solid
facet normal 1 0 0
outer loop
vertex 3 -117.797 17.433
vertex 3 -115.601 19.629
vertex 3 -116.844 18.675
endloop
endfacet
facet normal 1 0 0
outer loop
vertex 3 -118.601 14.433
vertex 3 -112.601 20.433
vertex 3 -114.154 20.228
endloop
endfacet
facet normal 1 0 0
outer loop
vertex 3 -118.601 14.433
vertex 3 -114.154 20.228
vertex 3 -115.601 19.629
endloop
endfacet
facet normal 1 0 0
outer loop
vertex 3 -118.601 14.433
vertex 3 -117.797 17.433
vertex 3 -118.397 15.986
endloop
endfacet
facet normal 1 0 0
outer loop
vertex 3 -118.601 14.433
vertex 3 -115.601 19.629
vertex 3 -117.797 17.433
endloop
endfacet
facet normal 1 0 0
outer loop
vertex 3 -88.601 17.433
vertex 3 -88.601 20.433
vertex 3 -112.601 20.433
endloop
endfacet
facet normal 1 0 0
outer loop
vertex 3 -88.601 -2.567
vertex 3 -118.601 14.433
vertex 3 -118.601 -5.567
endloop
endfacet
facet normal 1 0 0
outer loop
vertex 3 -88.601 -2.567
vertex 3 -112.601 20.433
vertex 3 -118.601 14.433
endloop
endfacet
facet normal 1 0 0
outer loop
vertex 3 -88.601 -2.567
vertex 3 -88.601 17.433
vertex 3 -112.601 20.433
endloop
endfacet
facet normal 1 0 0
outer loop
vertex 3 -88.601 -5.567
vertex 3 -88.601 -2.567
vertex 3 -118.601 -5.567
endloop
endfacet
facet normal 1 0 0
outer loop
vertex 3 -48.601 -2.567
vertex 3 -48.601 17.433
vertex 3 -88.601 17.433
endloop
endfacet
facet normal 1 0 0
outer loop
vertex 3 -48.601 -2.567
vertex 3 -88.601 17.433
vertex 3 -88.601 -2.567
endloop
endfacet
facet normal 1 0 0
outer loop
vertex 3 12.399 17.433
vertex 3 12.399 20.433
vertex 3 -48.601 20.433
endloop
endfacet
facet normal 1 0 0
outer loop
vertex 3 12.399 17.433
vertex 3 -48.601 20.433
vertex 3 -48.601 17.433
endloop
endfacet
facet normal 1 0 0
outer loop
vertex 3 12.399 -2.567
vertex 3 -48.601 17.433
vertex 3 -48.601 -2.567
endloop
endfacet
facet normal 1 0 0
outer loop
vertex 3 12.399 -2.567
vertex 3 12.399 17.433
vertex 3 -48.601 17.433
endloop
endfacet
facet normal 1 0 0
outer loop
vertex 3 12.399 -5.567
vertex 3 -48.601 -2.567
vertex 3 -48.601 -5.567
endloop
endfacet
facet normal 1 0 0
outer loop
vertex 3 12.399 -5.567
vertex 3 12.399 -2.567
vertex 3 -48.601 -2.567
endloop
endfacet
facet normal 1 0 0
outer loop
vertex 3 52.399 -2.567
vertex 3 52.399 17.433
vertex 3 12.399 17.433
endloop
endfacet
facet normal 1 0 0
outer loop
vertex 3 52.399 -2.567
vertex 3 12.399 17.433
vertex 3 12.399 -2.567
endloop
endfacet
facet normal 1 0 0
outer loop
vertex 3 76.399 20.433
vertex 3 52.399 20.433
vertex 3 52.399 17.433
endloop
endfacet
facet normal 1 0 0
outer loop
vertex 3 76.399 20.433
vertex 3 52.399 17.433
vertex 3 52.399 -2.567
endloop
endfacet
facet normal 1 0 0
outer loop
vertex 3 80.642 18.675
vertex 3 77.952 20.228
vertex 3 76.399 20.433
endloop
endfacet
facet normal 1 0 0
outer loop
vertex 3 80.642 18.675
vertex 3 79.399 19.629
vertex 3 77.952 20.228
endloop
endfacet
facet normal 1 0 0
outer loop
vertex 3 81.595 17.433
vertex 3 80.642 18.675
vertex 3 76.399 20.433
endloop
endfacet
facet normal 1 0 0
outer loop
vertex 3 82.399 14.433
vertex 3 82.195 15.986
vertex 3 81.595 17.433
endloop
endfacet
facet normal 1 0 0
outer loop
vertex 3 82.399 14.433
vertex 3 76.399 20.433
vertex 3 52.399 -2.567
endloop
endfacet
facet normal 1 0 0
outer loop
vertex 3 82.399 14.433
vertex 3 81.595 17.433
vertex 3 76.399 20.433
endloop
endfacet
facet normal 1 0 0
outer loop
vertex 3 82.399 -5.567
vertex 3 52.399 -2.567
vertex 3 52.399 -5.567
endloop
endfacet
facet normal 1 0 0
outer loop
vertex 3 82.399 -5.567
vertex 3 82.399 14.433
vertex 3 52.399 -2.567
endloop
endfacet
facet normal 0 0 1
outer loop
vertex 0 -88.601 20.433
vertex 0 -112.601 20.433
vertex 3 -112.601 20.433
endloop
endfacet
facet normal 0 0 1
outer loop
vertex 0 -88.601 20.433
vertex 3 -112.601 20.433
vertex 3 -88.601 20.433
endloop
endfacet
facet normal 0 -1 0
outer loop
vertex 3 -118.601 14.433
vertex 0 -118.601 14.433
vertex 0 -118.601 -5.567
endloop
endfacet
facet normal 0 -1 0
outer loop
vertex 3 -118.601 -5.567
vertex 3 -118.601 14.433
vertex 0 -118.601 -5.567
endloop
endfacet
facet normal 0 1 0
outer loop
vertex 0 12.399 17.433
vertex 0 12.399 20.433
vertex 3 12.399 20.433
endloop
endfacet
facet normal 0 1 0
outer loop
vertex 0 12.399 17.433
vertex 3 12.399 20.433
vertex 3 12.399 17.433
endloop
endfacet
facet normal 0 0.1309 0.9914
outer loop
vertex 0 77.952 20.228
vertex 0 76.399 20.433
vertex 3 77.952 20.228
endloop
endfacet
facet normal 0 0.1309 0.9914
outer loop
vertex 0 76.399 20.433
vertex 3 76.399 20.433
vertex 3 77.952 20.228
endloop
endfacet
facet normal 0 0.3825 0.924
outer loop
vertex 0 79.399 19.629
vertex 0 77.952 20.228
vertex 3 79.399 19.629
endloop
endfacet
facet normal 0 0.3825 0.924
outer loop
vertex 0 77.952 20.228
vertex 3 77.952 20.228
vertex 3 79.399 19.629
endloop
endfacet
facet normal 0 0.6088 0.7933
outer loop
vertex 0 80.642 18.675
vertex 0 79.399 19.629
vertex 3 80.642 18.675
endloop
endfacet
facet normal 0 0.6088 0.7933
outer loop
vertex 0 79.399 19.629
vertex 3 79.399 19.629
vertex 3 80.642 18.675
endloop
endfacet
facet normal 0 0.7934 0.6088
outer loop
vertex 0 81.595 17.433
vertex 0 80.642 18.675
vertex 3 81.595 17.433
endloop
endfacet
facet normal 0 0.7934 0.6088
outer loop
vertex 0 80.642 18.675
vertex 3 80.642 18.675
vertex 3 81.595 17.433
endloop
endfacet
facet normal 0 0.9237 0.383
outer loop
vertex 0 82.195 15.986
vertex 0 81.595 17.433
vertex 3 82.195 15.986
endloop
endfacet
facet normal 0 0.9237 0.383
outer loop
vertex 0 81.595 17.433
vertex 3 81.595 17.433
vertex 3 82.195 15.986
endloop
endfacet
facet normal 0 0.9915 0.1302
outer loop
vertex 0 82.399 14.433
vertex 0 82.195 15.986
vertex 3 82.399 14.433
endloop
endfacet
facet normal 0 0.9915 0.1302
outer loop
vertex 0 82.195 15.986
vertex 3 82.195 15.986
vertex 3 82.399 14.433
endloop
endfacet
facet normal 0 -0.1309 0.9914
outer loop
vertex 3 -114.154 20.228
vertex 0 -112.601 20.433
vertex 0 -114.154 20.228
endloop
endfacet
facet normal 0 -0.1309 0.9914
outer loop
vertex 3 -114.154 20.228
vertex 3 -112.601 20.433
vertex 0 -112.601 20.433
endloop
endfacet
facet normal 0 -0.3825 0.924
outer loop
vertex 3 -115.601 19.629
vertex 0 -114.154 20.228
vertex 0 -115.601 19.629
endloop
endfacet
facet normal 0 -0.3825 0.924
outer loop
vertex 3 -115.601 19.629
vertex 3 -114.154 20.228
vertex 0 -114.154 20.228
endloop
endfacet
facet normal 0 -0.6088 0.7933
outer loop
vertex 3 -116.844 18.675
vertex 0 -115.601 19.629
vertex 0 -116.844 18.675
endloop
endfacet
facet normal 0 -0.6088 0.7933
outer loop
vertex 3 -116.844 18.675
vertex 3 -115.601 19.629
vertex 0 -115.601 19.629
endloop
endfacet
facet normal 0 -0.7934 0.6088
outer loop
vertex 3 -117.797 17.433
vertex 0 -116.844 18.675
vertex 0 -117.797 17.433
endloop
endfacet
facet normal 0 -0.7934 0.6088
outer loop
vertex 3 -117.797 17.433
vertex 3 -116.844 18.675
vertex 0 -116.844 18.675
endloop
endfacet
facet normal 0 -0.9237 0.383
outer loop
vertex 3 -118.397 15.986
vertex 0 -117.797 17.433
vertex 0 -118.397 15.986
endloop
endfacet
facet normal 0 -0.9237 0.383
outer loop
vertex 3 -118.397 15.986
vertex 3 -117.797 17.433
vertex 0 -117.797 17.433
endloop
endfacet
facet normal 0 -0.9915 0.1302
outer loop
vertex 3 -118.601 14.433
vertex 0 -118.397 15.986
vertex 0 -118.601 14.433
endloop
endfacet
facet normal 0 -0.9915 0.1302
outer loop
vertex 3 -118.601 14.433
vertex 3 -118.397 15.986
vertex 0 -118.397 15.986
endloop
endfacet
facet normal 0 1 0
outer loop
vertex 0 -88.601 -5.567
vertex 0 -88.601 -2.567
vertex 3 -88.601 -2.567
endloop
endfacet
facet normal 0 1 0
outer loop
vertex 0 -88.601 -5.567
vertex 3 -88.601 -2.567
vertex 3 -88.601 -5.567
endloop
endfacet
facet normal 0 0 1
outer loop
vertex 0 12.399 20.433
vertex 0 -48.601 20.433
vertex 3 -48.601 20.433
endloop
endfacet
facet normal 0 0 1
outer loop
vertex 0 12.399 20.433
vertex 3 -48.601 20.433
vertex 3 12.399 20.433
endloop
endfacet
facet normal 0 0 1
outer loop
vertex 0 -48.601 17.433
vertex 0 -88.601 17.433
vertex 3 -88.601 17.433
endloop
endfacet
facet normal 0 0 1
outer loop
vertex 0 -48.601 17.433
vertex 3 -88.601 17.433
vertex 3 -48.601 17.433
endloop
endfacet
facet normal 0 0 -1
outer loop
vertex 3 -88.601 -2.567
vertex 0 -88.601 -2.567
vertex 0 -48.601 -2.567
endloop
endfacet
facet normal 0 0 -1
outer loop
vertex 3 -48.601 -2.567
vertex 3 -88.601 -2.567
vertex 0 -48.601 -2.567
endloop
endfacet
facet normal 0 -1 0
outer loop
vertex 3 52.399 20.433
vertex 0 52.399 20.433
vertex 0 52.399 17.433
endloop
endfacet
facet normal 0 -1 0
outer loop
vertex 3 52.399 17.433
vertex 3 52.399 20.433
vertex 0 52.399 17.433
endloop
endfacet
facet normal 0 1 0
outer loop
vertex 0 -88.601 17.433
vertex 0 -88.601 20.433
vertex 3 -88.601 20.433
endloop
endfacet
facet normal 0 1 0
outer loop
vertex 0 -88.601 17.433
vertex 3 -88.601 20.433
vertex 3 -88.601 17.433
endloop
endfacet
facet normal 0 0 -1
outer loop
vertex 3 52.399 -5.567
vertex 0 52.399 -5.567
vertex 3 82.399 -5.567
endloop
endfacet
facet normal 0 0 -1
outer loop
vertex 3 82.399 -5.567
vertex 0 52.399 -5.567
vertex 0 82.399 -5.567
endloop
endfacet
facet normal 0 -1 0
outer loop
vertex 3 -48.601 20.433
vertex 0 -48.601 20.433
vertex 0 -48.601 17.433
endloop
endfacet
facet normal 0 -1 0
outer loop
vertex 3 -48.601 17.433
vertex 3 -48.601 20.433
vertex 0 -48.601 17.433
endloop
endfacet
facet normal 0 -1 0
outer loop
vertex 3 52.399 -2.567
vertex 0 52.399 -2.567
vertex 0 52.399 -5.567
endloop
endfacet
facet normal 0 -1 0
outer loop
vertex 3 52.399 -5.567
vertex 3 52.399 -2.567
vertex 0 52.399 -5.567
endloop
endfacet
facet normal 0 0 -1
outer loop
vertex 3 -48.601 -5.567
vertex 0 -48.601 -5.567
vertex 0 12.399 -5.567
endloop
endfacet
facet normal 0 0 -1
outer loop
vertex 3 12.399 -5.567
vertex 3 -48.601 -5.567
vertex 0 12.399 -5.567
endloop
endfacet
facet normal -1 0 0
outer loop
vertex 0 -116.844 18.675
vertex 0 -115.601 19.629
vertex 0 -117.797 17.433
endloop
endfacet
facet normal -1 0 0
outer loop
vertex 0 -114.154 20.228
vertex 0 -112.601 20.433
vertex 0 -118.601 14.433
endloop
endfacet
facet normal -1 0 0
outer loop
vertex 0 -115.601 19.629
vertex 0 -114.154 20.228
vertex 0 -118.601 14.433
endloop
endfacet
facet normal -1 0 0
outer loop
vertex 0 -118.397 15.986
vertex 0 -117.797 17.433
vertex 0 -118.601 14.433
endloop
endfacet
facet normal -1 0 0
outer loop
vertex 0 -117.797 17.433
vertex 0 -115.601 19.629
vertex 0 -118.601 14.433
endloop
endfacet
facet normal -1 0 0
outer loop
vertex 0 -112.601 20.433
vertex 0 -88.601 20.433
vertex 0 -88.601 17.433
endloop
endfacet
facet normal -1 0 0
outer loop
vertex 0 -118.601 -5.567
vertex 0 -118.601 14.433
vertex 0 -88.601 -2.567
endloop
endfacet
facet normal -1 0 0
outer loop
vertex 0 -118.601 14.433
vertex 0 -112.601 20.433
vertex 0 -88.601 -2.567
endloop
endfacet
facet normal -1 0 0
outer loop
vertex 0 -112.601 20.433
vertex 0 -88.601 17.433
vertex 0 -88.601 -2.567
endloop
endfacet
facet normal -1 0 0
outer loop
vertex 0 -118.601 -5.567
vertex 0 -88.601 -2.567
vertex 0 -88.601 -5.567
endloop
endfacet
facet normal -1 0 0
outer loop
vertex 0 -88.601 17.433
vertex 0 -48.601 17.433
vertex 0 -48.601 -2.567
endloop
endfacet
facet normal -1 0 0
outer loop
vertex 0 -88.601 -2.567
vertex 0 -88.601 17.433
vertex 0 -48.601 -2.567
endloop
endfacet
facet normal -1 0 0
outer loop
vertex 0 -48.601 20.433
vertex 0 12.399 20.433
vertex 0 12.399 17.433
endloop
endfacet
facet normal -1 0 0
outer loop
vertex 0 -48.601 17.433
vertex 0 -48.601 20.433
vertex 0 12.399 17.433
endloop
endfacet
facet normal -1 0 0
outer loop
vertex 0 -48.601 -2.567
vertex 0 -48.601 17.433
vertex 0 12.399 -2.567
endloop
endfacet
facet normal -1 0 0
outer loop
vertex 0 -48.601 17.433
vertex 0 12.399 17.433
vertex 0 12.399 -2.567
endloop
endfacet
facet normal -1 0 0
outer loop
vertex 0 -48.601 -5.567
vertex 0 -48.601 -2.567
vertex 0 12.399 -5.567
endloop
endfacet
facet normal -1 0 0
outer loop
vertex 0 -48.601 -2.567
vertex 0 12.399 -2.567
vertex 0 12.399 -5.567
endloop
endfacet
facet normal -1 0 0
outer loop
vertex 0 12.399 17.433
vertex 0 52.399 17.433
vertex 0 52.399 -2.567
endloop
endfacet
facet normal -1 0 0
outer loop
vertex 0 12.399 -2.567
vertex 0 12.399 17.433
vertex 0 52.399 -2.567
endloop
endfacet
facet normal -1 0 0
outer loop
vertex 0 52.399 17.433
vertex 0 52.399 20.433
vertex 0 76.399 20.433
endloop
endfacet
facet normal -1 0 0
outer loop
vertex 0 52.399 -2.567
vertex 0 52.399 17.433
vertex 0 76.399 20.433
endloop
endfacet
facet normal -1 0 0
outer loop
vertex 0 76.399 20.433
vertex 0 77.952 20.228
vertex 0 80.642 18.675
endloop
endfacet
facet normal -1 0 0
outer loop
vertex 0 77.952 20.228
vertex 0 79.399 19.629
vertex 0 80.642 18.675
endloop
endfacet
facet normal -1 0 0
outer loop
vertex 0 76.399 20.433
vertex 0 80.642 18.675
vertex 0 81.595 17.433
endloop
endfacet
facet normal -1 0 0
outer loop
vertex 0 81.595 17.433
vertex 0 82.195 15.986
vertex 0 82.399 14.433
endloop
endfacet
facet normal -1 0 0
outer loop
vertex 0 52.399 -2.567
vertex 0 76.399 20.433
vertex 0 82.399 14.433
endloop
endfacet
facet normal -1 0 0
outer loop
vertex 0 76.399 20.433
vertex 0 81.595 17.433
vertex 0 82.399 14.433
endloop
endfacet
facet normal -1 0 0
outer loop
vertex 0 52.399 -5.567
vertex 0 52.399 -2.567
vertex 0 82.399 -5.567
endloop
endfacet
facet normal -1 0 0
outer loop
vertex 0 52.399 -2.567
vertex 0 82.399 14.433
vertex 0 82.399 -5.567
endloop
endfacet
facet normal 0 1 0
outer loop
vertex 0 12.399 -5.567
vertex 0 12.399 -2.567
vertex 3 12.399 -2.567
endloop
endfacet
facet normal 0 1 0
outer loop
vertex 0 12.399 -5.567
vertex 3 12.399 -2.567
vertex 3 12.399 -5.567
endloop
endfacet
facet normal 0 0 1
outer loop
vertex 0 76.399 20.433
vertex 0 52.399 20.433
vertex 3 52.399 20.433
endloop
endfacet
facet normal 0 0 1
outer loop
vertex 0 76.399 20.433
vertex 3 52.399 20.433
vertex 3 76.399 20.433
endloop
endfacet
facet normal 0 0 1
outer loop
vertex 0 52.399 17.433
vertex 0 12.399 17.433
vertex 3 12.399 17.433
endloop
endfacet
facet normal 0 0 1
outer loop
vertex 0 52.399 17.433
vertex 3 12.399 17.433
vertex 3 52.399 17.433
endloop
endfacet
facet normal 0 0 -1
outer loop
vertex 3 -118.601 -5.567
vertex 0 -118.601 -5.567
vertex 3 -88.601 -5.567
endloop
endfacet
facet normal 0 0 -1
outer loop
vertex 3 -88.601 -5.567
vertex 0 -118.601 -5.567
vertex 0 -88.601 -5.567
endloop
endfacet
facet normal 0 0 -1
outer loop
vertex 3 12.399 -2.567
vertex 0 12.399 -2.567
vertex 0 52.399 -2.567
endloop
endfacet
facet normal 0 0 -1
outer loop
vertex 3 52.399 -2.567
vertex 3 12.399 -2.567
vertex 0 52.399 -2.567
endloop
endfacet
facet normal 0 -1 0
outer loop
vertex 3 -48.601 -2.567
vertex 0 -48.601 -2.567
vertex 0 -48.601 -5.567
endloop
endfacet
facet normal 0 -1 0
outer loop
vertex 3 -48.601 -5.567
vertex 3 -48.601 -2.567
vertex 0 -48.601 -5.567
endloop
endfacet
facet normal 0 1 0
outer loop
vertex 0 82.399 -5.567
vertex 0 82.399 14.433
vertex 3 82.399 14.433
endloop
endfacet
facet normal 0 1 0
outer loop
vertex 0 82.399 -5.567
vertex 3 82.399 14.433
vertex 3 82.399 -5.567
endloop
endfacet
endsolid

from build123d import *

# Parameters (mm, degrees)
SKETCH_1_W          = 26
SKETCH_1_H          = 201
EXTRUDE_1_DEPTH     = 3
SKETCH_2_W          = 3
SKETCH_2_H          = 40
CUT_EXTRUDE_1_DEPTH = 3
FILLET_2_R          = 6
FILLET_3_R          = 6


with BuildPart() as part:
    # 草图1 → 凸台-拉伸1 (new body)
    with BuildSketch(Plane(origin=(0, 0, 0), x_dir=(0, 0, -1), z_dir=(1, 0, 0))):
        with Locations((-7.432605804, -18.101046442)):
            Rectangle(SKETCH_1_W, SKETCH_1_H)
    extrude(amount=EXTRUDE_1_DEPTH)

    # 草图2 → 切除-拉伸1 (cut)
    with BuildSketch(Plane(origin=(0, 0, 0), x_dir=(0, 0, -1), z_dir=(1, 0, 0))):
        with Locations((4.067394196, -68.601046442)):
            Rectangle(SKETCH_2_W, SKETCH_2_H)
        with Locations((-18.932605804, -68.601046442)):
            Rectangle(SKETCH_2_W, SKETCH_2_H)
        with Locations((-18.932605804, 32.398953558)):
            Rectangle(SKETCH_2_W, SKETCH_2_H)
        with Locations((4.067394196, 32.398953558)):
            Rectangle(SKETCH_2_W, SKETCH_2_H)
    extrude(amount=CUT_EXTRUDE_1_DEPTH, mode=Mode.SUBTRACT)

    # 圆角2
    fillet_2_edges = [part.edges().sort_by_distance(p)[0] for p in [
        (1.5, -118.601046442, 20.432605804),
    ]]
    fillet(fillet_2_edges, radius=FILLET_2_R)

    # 圆角3
    fillet_3_edges = [part.edges().sort_by_distance(p)[0] for p in [
        (1.5, 82.398953558, 20.432605804),
    ]]
    fillet(fillet_3_edges, radius=FILLET_3_R)


solid = part.part
